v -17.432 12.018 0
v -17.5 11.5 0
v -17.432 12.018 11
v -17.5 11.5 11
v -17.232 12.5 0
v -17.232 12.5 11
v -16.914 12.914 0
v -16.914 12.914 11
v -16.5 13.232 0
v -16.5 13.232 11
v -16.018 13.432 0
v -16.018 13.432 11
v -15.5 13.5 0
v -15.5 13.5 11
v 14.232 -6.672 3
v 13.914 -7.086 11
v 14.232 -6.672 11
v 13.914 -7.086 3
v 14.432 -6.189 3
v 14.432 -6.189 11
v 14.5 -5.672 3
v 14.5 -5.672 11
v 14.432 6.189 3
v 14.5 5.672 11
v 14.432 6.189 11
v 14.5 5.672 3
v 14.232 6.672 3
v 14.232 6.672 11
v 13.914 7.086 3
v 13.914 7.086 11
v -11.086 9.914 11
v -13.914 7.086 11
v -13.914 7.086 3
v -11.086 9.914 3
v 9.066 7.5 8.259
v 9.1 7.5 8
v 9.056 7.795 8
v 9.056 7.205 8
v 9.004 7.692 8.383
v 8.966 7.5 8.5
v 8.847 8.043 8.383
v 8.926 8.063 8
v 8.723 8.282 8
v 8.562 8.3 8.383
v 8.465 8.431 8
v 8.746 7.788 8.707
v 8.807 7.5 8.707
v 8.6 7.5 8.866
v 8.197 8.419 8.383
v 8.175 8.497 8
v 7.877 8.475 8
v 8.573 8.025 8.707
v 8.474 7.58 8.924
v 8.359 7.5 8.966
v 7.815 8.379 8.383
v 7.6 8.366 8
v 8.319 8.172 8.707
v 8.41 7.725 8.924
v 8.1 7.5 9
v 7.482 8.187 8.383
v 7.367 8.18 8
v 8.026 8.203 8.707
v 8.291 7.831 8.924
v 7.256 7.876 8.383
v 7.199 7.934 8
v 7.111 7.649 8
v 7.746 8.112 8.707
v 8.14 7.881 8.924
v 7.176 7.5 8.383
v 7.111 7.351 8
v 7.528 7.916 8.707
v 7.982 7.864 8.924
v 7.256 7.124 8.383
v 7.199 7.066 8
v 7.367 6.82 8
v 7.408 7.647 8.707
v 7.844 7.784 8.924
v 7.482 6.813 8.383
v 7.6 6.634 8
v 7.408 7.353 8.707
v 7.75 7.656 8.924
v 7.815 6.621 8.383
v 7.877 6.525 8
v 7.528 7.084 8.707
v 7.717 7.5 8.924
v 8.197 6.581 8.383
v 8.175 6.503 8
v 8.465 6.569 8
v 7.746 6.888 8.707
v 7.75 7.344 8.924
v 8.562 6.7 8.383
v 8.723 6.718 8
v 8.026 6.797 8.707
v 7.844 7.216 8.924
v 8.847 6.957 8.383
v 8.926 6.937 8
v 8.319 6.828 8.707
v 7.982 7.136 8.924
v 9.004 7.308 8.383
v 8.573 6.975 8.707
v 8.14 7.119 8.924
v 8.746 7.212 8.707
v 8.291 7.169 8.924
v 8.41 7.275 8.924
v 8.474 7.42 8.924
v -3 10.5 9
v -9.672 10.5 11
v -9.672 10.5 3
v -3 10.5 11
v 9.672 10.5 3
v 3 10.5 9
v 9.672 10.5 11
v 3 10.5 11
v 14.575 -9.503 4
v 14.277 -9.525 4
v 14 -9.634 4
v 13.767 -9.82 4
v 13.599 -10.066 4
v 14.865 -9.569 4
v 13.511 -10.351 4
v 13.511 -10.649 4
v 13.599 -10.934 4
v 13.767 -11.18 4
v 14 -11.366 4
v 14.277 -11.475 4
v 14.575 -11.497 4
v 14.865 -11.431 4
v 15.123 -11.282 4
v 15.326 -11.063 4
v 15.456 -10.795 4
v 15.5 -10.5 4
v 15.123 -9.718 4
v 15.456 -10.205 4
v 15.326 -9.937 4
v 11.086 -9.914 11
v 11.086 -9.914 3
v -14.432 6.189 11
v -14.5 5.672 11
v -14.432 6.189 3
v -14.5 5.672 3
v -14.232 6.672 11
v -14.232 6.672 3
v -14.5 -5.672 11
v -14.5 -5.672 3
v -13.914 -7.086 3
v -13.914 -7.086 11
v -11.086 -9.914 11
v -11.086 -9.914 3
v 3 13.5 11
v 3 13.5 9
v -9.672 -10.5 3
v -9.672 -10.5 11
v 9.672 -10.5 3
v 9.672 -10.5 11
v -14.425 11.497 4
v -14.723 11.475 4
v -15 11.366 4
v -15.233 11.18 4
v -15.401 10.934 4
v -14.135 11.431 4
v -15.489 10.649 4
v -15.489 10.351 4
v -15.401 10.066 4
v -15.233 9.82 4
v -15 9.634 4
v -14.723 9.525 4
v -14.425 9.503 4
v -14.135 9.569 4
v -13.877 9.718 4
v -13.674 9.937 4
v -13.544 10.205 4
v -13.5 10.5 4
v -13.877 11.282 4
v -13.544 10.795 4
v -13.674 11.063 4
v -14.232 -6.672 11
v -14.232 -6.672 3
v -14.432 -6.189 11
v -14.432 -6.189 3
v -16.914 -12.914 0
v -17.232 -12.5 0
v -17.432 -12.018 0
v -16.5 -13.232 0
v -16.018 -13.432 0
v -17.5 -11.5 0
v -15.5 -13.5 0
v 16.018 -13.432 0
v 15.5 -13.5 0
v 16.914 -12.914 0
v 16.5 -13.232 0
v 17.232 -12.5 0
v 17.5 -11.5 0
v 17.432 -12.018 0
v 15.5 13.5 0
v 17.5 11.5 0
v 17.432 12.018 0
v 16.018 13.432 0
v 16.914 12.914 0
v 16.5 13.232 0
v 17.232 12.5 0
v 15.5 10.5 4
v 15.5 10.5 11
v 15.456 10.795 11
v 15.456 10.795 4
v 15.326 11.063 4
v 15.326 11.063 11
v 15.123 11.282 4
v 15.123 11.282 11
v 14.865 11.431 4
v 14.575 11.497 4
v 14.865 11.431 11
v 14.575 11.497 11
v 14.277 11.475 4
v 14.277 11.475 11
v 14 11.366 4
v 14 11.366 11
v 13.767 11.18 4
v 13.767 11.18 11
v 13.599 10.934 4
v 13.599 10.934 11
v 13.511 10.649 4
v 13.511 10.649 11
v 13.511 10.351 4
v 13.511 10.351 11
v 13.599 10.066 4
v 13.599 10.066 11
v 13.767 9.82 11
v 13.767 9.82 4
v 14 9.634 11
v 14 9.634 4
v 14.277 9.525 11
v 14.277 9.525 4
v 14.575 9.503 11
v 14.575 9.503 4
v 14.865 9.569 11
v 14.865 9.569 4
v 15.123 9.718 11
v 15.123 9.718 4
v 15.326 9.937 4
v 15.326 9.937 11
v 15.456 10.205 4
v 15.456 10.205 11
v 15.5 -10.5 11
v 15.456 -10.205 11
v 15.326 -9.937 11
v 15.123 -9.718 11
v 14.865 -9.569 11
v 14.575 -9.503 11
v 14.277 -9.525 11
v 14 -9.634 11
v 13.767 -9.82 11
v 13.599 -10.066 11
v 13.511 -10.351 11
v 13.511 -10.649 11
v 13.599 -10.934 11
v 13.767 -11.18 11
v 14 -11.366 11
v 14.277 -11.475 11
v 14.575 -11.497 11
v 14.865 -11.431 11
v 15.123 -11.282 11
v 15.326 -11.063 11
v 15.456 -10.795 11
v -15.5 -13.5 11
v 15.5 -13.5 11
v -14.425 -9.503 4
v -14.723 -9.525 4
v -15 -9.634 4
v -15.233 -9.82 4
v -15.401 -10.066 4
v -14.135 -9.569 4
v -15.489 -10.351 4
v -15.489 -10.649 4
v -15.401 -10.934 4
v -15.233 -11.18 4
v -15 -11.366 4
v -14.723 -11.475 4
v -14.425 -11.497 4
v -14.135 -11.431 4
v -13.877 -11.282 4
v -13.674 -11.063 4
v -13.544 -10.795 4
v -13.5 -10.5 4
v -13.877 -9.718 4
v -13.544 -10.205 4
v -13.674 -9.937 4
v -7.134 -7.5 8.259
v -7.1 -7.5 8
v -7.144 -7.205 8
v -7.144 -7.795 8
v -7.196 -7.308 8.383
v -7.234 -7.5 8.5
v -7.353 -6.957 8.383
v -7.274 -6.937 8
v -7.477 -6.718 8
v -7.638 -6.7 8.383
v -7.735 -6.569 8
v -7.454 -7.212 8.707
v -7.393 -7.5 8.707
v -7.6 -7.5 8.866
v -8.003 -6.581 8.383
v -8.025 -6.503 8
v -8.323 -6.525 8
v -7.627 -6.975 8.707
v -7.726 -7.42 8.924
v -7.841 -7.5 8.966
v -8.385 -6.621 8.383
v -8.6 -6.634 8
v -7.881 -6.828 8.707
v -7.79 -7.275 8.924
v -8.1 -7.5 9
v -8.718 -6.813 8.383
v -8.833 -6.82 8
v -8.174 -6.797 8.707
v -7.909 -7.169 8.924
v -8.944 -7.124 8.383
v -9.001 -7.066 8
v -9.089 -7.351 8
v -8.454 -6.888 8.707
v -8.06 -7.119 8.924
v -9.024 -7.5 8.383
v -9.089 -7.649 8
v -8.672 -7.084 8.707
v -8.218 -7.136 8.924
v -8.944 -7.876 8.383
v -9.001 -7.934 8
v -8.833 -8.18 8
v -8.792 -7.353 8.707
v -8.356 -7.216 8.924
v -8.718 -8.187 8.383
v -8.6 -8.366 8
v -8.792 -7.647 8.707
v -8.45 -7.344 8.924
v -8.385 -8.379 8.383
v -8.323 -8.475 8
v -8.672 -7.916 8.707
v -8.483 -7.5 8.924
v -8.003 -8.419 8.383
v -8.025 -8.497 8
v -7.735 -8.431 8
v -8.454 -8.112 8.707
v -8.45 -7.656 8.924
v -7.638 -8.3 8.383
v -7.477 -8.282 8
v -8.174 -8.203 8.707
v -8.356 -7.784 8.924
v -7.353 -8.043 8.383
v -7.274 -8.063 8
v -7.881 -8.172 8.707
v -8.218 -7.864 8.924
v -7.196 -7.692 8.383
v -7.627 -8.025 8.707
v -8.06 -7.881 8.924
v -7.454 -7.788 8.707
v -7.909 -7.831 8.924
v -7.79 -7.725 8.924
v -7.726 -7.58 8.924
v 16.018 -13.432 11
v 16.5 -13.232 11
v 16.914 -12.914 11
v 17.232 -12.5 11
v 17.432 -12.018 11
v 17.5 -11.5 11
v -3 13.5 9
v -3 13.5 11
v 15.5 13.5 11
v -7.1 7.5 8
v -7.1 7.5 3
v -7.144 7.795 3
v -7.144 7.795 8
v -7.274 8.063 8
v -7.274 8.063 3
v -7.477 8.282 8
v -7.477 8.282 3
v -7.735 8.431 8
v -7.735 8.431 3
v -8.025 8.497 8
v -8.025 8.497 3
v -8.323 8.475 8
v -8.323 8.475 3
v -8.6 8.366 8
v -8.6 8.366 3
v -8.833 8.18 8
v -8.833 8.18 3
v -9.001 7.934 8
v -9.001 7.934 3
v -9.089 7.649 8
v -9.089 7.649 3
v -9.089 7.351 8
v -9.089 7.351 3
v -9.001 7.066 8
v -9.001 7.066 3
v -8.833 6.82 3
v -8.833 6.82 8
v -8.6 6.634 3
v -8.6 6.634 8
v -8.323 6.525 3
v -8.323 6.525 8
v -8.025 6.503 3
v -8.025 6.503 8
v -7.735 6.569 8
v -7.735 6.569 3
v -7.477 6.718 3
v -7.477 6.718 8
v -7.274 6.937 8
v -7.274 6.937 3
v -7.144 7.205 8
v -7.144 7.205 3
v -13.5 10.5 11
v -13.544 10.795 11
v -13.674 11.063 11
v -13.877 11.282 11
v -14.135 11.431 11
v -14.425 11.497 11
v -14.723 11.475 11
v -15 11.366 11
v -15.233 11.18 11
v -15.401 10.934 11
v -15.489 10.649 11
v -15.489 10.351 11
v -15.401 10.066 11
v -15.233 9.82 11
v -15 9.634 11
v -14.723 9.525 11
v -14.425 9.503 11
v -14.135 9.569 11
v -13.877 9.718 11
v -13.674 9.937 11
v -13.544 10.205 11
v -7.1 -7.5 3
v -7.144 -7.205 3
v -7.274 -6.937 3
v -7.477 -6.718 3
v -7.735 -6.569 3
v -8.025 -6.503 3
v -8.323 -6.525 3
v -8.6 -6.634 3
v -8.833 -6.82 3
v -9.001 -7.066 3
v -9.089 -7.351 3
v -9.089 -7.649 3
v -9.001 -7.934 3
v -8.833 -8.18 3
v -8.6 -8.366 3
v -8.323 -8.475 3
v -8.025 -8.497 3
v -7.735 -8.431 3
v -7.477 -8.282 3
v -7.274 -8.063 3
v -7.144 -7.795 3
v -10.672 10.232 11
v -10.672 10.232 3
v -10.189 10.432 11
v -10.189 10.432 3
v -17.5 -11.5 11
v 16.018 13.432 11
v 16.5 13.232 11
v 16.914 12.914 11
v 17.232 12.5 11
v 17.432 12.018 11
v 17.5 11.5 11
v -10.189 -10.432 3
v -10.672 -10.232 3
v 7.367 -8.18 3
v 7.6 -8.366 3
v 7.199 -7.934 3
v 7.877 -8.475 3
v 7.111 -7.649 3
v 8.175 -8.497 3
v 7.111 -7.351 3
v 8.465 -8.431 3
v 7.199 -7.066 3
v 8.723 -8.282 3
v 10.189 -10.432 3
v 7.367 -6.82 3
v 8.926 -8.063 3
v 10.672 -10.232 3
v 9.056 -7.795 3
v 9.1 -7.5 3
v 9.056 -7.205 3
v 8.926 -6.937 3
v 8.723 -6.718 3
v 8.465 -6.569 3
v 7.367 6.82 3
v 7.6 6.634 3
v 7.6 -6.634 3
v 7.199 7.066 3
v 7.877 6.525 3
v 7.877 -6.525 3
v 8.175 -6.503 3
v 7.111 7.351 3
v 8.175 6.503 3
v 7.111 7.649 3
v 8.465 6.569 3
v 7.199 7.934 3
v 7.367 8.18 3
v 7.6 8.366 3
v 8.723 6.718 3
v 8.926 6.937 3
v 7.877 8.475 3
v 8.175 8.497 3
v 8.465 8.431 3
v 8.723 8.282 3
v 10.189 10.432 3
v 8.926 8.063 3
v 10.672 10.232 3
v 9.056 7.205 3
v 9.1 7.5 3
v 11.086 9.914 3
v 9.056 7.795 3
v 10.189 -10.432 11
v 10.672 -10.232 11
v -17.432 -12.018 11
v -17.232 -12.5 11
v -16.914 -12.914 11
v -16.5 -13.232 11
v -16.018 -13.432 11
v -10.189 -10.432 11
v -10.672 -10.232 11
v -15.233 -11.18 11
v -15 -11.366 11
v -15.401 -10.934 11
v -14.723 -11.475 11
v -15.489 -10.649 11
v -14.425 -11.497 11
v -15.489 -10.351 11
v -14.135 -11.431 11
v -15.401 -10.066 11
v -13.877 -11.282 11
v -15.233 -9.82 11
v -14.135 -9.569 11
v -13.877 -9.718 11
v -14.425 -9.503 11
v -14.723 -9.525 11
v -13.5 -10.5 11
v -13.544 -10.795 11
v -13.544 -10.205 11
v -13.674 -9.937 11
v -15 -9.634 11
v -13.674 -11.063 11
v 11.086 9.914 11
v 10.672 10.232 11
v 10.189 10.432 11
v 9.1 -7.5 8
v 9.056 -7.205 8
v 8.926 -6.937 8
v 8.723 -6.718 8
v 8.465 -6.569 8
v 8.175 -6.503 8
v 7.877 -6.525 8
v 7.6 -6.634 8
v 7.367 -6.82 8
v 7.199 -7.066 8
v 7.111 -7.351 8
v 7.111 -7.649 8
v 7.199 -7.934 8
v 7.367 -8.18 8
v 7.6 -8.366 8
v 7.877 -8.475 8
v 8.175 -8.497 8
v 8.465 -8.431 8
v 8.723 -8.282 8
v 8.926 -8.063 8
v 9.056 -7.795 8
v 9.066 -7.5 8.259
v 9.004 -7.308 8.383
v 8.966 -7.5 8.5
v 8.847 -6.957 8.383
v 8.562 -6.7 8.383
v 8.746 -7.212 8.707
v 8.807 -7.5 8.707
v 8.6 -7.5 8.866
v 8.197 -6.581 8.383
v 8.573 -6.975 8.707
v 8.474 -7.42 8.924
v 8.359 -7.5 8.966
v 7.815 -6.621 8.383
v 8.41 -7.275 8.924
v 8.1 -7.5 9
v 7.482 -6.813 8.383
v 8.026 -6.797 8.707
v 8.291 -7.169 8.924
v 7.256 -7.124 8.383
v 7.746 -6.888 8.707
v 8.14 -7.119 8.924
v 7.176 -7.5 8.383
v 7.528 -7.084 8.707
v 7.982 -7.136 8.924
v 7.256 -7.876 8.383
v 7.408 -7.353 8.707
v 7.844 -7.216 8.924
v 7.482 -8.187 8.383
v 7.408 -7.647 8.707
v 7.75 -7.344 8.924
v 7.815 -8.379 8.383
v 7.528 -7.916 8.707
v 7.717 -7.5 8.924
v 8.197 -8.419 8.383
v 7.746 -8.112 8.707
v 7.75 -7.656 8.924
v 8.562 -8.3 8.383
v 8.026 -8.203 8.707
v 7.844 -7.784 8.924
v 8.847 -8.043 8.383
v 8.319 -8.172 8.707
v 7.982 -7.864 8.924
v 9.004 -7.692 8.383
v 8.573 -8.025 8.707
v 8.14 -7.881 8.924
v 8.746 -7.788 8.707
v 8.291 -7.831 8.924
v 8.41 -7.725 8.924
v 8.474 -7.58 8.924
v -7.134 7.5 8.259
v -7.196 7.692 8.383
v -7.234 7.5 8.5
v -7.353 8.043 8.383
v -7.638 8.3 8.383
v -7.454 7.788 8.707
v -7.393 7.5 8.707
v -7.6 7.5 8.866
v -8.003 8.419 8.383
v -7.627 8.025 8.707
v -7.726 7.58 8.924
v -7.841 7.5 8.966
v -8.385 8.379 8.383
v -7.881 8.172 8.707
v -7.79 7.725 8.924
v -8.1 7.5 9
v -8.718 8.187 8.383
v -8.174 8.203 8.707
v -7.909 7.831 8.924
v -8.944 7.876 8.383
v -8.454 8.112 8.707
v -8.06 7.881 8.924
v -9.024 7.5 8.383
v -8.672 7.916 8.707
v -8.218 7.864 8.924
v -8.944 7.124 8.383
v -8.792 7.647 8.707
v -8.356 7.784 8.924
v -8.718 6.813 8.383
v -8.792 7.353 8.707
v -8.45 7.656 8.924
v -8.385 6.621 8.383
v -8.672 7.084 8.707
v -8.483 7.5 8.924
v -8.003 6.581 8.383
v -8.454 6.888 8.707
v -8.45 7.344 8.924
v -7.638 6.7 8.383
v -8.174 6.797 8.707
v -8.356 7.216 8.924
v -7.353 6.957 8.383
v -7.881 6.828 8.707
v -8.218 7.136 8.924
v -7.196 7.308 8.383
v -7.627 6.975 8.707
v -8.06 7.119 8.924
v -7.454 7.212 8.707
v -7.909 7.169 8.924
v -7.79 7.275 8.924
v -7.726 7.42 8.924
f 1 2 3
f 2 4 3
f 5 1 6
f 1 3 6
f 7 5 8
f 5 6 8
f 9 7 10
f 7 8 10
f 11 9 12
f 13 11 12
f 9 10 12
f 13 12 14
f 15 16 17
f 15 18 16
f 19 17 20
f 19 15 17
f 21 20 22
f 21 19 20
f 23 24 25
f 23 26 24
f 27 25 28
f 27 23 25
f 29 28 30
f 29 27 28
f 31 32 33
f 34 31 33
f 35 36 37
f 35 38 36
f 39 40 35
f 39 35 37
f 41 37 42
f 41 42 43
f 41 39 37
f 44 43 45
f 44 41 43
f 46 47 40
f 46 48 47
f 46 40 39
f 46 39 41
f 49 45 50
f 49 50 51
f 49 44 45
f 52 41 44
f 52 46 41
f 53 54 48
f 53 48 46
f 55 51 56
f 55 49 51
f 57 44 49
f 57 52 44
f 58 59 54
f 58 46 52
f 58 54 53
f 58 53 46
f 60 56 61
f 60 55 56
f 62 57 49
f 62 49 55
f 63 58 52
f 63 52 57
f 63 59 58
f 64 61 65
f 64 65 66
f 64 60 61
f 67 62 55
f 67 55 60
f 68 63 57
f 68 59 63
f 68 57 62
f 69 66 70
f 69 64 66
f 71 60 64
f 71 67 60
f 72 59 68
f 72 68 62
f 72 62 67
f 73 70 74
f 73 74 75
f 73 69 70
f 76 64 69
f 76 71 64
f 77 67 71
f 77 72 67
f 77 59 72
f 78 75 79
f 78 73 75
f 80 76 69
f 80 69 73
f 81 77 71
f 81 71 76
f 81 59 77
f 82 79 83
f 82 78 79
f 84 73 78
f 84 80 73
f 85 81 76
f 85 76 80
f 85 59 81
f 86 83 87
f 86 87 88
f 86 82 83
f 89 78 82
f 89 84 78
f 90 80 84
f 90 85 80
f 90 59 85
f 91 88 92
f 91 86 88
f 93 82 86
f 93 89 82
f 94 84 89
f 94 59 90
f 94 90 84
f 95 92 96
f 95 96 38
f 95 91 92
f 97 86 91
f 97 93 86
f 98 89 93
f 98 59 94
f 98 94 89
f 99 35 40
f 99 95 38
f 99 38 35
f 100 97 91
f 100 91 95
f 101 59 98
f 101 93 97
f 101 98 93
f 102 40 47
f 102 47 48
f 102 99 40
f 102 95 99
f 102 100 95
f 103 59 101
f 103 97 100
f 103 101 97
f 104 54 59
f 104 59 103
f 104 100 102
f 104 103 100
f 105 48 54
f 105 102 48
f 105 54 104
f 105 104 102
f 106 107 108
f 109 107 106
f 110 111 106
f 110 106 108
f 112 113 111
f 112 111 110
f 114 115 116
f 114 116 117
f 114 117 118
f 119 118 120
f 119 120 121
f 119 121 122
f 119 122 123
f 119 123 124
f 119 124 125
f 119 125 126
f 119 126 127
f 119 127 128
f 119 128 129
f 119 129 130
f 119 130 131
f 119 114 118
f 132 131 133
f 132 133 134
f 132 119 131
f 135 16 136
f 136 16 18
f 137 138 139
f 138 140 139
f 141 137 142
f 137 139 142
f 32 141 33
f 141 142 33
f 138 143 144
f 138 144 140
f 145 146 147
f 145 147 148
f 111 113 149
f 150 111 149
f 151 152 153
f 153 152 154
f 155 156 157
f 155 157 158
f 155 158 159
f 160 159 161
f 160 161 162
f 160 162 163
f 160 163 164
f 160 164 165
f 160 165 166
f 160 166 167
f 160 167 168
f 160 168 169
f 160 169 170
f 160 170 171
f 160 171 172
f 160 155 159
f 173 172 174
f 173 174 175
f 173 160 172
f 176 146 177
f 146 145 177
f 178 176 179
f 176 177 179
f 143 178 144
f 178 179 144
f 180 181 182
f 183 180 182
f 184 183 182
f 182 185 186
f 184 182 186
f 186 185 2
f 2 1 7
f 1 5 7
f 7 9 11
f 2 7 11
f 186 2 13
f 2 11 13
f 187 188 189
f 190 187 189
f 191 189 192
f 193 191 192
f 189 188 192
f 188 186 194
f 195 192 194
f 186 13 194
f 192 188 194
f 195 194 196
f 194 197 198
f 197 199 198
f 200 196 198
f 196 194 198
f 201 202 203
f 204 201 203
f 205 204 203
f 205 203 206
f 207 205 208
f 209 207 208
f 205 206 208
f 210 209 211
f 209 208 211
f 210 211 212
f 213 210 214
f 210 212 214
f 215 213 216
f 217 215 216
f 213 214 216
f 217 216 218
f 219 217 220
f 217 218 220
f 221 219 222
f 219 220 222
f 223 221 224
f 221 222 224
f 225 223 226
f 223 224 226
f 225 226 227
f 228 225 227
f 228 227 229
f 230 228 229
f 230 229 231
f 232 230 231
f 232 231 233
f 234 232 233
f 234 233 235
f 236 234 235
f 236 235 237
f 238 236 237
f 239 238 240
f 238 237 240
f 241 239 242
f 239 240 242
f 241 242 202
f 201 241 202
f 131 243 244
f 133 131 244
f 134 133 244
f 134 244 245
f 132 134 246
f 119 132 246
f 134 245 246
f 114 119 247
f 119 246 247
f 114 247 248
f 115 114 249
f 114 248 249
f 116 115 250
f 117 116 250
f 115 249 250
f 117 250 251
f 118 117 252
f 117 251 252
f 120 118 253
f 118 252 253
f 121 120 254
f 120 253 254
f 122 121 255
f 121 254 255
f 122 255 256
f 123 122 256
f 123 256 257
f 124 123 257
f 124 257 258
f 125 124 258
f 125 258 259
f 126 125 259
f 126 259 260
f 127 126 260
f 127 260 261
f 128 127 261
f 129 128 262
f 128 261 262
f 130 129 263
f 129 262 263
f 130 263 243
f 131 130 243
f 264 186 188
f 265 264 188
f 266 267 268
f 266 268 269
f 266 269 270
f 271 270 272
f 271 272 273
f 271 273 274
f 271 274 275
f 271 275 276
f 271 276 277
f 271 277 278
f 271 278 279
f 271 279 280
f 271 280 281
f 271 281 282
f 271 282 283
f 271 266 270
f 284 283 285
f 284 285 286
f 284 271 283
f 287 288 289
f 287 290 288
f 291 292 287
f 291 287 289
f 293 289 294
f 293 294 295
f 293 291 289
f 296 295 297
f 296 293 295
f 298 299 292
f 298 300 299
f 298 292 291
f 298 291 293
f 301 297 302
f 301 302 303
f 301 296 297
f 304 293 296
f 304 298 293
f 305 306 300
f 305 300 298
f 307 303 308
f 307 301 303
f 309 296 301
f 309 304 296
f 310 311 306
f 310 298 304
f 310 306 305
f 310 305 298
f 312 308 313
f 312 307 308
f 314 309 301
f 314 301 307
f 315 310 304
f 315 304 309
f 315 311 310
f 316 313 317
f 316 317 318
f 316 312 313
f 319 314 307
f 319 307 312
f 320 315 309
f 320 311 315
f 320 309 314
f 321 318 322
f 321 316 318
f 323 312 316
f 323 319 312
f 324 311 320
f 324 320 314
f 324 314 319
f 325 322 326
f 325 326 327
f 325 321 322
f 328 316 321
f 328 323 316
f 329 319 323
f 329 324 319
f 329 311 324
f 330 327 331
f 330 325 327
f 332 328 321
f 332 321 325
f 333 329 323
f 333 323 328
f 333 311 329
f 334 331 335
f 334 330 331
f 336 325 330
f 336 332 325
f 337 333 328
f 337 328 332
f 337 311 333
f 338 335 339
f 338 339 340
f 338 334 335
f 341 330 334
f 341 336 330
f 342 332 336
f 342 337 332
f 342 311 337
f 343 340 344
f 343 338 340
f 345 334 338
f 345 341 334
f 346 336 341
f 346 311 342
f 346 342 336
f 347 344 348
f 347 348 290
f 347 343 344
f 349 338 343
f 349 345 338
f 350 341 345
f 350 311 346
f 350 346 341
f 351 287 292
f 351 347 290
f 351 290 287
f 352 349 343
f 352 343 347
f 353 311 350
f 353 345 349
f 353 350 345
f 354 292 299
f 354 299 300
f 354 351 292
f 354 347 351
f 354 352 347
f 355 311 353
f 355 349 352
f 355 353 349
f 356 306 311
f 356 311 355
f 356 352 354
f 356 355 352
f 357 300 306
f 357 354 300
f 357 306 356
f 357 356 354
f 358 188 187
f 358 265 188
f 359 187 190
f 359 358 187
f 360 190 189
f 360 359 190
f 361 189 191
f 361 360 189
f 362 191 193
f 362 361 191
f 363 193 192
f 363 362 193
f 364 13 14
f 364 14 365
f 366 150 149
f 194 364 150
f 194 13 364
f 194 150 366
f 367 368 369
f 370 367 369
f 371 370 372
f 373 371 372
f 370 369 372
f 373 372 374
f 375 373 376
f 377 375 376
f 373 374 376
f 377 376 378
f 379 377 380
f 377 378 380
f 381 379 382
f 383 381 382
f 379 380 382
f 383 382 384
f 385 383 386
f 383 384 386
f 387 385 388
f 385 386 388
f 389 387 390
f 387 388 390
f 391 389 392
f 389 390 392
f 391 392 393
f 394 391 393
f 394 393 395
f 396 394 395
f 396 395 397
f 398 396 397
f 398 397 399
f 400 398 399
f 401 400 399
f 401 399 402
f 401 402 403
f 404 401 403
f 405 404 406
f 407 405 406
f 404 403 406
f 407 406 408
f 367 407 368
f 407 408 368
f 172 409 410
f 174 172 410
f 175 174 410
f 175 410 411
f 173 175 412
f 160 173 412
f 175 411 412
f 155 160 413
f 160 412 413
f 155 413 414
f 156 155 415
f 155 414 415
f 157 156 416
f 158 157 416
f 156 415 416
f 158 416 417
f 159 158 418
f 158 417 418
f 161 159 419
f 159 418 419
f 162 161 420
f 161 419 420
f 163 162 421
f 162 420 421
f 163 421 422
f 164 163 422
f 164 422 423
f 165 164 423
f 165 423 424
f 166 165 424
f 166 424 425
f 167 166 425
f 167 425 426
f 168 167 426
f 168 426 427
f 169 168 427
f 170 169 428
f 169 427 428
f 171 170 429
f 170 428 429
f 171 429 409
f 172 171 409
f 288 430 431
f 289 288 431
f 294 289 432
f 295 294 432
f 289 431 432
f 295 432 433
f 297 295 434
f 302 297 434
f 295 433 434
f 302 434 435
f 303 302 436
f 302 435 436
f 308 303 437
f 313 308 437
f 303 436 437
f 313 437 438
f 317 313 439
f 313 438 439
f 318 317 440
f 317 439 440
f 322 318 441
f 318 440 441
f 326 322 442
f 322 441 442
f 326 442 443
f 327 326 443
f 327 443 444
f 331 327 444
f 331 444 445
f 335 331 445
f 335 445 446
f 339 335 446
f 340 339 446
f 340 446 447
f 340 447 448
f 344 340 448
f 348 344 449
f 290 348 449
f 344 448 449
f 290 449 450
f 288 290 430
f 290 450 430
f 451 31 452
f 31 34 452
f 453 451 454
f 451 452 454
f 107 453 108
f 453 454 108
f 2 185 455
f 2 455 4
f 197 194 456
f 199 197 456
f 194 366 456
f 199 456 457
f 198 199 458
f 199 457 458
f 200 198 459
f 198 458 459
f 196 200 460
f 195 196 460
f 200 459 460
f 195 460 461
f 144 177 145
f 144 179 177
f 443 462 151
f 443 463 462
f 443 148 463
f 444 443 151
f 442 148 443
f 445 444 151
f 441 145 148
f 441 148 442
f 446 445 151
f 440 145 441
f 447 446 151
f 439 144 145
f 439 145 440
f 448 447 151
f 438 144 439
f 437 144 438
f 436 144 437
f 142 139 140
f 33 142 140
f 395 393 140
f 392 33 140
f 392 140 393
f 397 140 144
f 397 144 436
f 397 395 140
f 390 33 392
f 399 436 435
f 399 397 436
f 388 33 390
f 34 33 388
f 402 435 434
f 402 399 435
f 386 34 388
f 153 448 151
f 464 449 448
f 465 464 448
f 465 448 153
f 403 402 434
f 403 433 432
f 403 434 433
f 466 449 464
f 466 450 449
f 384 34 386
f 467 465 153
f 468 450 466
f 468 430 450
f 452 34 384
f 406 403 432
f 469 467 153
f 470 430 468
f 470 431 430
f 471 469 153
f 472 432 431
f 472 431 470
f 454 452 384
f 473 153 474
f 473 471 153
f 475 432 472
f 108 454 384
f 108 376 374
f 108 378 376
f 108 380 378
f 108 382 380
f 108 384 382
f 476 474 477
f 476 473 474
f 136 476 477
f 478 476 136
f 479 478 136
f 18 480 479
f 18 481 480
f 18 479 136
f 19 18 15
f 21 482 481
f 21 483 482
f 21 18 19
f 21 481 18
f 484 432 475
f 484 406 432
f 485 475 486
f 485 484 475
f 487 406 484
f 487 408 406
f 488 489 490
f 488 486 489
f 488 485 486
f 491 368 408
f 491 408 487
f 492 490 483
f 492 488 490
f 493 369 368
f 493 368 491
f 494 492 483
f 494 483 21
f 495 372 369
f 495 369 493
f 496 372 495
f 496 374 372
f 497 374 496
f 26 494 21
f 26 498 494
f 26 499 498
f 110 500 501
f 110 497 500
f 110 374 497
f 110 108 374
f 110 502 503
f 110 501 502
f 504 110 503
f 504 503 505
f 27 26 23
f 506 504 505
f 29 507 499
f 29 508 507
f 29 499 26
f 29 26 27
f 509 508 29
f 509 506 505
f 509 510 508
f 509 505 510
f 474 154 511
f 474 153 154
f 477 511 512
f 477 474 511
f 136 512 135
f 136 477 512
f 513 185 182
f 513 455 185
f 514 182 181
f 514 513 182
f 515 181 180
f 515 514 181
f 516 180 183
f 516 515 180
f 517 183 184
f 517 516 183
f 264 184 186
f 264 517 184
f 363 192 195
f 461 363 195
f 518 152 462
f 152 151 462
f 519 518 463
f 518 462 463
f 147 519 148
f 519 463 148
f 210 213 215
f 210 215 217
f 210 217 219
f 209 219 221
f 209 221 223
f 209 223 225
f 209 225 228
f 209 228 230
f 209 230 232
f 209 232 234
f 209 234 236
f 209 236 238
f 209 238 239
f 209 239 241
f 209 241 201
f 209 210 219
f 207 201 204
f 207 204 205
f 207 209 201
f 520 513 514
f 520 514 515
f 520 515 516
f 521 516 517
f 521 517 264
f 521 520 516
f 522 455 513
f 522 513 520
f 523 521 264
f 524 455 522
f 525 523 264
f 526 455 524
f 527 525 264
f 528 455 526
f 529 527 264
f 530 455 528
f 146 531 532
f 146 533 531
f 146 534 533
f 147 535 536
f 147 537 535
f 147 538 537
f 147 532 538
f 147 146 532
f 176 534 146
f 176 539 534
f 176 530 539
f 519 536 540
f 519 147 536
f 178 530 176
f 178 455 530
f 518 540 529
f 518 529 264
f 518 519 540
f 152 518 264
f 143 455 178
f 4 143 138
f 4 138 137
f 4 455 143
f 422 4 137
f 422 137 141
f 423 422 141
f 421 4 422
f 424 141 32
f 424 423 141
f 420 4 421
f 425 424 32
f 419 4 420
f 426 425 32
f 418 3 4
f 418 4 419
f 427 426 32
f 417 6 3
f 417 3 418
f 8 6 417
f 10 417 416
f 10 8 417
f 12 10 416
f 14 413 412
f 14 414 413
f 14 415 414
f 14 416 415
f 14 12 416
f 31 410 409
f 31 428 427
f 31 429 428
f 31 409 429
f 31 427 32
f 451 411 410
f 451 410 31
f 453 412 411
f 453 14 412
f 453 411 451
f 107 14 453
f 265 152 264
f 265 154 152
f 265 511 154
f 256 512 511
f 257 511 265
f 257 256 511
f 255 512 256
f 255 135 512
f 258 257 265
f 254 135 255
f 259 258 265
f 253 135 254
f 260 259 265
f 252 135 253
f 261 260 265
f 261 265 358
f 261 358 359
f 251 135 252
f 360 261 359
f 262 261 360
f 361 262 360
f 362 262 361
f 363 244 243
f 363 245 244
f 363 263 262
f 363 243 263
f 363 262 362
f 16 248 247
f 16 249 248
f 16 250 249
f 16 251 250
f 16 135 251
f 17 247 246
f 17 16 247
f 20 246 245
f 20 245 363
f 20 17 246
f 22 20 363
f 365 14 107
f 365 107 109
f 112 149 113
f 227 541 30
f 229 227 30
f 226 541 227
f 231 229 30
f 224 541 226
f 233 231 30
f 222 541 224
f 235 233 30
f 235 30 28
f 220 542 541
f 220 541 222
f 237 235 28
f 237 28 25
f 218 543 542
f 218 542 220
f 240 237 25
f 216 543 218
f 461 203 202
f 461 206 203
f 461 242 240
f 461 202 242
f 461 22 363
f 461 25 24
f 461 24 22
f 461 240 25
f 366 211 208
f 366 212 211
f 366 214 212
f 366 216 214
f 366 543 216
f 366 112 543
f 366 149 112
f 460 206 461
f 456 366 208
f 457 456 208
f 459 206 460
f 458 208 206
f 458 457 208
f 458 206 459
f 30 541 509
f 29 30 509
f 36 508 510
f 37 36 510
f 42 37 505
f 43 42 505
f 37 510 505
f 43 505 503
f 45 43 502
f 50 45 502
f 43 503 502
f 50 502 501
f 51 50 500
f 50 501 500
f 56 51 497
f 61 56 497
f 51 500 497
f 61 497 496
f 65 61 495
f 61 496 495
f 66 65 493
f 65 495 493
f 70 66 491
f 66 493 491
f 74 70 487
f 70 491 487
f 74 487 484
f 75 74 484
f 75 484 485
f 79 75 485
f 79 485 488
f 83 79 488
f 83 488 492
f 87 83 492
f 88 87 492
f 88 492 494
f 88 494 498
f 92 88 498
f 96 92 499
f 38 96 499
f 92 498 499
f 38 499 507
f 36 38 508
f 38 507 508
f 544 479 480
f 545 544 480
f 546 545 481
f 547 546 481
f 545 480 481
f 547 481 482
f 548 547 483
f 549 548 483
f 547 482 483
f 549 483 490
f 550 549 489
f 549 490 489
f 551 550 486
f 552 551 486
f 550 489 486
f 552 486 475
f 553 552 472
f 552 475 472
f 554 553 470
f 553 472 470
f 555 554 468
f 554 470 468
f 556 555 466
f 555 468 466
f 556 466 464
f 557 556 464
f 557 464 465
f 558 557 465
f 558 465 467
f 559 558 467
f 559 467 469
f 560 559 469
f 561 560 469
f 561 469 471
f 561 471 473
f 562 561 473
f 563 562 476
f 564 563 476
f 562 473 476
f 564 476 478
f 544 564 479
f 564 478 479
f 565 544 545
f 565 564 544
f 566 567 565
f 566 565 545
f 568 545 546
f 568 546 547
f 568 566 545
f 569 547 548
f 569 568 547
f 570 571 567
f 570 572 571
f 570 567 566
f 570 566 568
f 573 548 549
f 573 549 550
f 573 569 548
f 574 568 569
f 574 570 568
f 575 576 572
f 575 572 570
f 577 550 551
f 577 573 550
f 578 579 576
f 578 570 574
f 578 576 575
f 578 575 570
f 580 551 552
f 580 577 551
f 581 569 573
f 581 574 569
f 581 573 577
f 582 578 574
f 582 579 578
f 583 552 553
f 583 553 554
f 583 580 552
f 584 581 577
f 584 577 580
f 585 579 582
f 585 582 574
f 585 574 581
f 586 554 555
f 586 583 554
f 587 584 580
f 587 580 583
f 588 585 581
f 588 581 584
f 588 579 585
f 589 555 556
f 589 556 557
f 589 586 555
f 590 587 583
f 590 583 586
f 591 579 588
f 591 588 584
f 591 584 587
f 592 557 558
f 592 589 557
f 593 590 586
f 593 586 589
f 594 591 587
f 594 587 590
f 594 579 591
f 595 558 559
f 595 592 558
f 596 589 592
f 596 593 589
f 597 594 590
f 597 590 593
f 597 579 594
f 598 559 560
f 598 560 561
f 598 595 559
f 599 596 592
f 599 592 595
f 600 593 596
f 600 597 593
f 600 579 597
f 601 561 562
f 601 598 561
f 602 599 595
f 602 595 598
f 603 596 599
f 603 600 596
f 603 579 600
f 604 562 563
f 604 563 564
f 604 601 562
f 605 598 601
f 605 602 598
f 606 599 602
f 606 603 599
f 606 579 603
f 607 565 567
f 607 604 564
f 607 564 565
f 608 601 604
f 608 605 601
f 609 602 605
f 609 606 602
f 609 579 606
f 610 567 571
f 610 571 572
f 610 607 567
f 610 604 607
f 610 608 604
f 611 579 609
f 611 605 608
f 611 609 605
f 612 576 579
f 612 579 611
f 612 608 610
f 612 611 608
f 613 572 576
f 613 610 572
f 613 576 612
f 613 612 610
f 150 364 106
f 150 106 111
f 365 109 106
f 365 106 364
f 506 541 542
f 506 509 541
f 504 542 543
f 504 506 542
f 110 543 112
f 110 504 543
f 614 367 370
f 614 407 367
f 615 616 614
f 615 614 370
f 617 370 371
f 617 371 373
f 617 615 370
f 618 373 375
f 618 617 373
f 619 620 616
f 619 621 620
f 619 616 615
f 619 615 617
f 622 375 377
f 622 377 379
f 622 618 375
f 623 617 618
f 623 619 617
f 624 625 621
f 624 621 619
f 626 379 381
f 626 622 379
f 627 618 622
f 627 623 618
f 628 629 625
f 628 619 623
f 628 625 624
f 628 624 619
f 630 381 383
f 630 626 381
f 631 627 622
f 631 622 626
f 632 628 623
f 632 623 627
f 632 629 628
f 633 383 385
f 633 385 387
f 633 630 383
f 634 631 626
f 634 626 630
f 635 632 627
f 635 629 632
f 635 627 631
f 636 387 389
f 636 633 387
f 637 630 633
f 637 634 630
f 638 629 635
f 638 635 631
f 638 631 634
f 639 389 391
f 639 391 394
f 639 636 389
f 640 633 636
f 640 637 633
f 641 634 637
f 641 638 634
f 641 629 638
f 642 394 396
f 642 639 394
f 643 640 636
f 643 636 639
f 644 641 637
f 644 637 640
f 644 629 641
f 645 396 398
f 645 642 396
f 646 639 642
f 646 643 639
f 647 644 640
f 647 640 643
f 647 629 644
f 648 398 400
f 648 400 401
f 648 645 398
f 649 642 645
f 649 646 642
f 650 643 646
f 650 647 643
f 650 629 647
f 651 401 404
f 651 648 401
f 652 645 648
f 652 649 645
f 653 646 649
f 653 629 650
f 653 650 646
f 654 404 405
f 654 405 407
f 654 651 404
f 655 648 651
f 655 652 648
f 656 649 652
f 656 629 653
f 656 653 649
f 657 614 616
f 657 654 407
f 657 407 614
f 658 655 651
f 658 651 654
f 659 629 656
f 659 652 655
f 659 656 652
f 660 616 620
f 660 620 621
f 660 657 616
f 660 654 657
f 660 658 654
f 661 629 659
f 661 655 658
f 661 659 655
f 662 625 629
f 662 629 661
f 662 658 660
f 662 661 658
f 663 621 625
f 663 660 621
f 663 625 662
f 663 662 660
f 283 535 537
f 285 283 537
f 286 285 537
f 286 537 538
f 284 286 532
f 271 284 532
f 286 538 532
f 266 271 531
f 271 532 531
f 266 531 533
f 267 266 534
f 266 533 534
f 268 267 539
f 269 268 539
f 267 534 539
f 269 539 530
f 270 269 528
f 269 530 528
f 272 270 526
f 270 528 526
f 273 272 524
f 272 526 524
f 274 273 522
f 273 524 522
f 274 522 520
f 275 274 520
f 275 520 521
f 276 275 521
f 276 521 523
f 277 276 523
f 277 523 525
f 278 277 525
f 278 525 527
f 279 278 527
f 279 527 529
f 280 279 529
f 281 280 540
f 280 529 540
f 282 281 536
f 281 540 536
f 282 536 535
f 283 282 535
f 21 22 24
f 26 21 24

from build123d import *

# Parameters (mm, degrees)
ESQUISSE1_W             = 35
ESQUISSE1_H             = 27
BOSS_EXTRU_1_DEPTH      = 11
ESQUISSE2_W             = 29
ESQUISSE2_H             = 21
ENL_V_MAT_EXTRU_1_DEPTH = 8
CHANFREIN1_SIZE         = 4
ESQUISSE3_R             = 1
ENL_V_MAT_EXTRU_2_DEPTH = 7
ESQUISSE4_R             = 1
BOSS_EXTRU_2_DEPTH      = 6
CONG_2_R                = 1
CONG_3_R                = 2
CONG_4_R                = 2
ESQUISSE5_W             = 6
ESQUISSE5_H             = 3
ENL_V_MAT_EXTRU_3_DEPTH = 2


with BuildPart() as part:
    # Esquisse1 → Boss.-Extru.1 (new body)
    with BuildSketch(Plane.XY):
        Rectangle(ESQUISSE1_W, ESQUISSE1_H)
    extrude(amount=BOSS_EXTRU_1_DEPTH)

    # Esquisse2 → Enl_v. mat.-Extru.1 (cut)
    with BuildSketch(Plane.XY.offset(11)):
        Rectangle(ESQUISSE2_W, ESQUISSE2_H)
    extrude(amount=-ENL_V_MAT_EXTRU_1_DEPTH, mode=Mode.SUBTRACT)

    # Chanfrein1
    chanfrein1_edges = [part.edges().sort_by_distance(p)[0] for p in [
        (-14.5, -10.5, 7),
        (-14.5, 10.5, 7),
        (14.5, 10.5, 7),
        (14.5, -10.5, 7),
    ]]
    chamfer(chanfrein1_edges, length=CHANFREIN1_SIZE)

    # Esquisse3 → Enl_v. mat.-Extru.2 (cut)
    with BuildSketch(Plane.XY.offset(11)):
        with Locations((-14.5, 10.5)):
            Circle(ESQUISSE3_R)
        with Locations((14.5, 10.5)):
            Circle(ESQUISSE3_R)
        with Locations((14.5, -10.5)):
            Circle(ESQUISSE3_R)
        with Locations((-14.5, -10.5)):
            Circle(ESQUISSE3_R)
    extrude(amount=-ENL_V_MAT_EXTRU_2_DEPTH, mode=Mode.SUBTRACT)

    # Esquisse4 → Boss.-Extru.2 (add)
    with BuildSketch(Plane.XY.offset(3)):
        with Locations((-8.1, 7.5)):
            Circle(ESQUISSE4_R)
        with Locations((8.1, 7.5)):
            Circle(ESQUISSE4_R)
        with Locations((-8.1, -7.5)):
            Circle(ESQUISSE4_R)
        with Locations((8.1, -7.5)):
            Circle(ESQUISSE4_R)
    extrude(amount=BOSS_EXTRU_2_DEPTH)

    # Cong_2
    cong_2_edges = [part.edges().sort_by_distance(p)[0] for p in [
        (-9.1, 7.5, 9),
        (7.1, 7.5, 9),
        (-9.1, -7.5, 9),
        (7.1, -7.5, 9),
    ]]
    fillet(cong_2_edges, radius=CONG_2_R)

    # Cong_3
    cong_3_edges = [part.edges().sort_by_distance(p)[0] for p in [
        (-17.5, 13.5, 5.5),
        (17.5, 13.5, 5.5),
        (17.5, -13.5, 5.5),
        (-17.5, -13.5, 5.5),
    ]]
    fillet(cong_3_edges, radius=CONG_3_R)

    # Cong_4
    cong_4_edges = [part.edges().sort_by_distance(p)[0] for p in [
        (10.5, -10.5, 7),
        (-10.5, -10.5, 7),
        (-14.5, 6.5, 7),
        (-14.5, -6.5, 7),
        (14.5, 6.5, 7),
        (14.5, -6.5, 7),
        (-10.5, 10.5, 7),
        (10.5, 10.5, 7),
    ]]
    fillet(cong_4_edges, radius=CONG_4_R)

    # Esquisse5 → Enl_v. mat.-Extru.3 (cut)
    with BuildSketch(Plane.XY.offset(11)):
        with Locations((0, 12)):
            Rectangle(ESQUISSE5_W, ESQUISSE5_H)
    extrude(amount=-ENL_V_MAT_EXTRU_3_DEPTH, mode=Mode.SUBTRACT)


solid = part.part
